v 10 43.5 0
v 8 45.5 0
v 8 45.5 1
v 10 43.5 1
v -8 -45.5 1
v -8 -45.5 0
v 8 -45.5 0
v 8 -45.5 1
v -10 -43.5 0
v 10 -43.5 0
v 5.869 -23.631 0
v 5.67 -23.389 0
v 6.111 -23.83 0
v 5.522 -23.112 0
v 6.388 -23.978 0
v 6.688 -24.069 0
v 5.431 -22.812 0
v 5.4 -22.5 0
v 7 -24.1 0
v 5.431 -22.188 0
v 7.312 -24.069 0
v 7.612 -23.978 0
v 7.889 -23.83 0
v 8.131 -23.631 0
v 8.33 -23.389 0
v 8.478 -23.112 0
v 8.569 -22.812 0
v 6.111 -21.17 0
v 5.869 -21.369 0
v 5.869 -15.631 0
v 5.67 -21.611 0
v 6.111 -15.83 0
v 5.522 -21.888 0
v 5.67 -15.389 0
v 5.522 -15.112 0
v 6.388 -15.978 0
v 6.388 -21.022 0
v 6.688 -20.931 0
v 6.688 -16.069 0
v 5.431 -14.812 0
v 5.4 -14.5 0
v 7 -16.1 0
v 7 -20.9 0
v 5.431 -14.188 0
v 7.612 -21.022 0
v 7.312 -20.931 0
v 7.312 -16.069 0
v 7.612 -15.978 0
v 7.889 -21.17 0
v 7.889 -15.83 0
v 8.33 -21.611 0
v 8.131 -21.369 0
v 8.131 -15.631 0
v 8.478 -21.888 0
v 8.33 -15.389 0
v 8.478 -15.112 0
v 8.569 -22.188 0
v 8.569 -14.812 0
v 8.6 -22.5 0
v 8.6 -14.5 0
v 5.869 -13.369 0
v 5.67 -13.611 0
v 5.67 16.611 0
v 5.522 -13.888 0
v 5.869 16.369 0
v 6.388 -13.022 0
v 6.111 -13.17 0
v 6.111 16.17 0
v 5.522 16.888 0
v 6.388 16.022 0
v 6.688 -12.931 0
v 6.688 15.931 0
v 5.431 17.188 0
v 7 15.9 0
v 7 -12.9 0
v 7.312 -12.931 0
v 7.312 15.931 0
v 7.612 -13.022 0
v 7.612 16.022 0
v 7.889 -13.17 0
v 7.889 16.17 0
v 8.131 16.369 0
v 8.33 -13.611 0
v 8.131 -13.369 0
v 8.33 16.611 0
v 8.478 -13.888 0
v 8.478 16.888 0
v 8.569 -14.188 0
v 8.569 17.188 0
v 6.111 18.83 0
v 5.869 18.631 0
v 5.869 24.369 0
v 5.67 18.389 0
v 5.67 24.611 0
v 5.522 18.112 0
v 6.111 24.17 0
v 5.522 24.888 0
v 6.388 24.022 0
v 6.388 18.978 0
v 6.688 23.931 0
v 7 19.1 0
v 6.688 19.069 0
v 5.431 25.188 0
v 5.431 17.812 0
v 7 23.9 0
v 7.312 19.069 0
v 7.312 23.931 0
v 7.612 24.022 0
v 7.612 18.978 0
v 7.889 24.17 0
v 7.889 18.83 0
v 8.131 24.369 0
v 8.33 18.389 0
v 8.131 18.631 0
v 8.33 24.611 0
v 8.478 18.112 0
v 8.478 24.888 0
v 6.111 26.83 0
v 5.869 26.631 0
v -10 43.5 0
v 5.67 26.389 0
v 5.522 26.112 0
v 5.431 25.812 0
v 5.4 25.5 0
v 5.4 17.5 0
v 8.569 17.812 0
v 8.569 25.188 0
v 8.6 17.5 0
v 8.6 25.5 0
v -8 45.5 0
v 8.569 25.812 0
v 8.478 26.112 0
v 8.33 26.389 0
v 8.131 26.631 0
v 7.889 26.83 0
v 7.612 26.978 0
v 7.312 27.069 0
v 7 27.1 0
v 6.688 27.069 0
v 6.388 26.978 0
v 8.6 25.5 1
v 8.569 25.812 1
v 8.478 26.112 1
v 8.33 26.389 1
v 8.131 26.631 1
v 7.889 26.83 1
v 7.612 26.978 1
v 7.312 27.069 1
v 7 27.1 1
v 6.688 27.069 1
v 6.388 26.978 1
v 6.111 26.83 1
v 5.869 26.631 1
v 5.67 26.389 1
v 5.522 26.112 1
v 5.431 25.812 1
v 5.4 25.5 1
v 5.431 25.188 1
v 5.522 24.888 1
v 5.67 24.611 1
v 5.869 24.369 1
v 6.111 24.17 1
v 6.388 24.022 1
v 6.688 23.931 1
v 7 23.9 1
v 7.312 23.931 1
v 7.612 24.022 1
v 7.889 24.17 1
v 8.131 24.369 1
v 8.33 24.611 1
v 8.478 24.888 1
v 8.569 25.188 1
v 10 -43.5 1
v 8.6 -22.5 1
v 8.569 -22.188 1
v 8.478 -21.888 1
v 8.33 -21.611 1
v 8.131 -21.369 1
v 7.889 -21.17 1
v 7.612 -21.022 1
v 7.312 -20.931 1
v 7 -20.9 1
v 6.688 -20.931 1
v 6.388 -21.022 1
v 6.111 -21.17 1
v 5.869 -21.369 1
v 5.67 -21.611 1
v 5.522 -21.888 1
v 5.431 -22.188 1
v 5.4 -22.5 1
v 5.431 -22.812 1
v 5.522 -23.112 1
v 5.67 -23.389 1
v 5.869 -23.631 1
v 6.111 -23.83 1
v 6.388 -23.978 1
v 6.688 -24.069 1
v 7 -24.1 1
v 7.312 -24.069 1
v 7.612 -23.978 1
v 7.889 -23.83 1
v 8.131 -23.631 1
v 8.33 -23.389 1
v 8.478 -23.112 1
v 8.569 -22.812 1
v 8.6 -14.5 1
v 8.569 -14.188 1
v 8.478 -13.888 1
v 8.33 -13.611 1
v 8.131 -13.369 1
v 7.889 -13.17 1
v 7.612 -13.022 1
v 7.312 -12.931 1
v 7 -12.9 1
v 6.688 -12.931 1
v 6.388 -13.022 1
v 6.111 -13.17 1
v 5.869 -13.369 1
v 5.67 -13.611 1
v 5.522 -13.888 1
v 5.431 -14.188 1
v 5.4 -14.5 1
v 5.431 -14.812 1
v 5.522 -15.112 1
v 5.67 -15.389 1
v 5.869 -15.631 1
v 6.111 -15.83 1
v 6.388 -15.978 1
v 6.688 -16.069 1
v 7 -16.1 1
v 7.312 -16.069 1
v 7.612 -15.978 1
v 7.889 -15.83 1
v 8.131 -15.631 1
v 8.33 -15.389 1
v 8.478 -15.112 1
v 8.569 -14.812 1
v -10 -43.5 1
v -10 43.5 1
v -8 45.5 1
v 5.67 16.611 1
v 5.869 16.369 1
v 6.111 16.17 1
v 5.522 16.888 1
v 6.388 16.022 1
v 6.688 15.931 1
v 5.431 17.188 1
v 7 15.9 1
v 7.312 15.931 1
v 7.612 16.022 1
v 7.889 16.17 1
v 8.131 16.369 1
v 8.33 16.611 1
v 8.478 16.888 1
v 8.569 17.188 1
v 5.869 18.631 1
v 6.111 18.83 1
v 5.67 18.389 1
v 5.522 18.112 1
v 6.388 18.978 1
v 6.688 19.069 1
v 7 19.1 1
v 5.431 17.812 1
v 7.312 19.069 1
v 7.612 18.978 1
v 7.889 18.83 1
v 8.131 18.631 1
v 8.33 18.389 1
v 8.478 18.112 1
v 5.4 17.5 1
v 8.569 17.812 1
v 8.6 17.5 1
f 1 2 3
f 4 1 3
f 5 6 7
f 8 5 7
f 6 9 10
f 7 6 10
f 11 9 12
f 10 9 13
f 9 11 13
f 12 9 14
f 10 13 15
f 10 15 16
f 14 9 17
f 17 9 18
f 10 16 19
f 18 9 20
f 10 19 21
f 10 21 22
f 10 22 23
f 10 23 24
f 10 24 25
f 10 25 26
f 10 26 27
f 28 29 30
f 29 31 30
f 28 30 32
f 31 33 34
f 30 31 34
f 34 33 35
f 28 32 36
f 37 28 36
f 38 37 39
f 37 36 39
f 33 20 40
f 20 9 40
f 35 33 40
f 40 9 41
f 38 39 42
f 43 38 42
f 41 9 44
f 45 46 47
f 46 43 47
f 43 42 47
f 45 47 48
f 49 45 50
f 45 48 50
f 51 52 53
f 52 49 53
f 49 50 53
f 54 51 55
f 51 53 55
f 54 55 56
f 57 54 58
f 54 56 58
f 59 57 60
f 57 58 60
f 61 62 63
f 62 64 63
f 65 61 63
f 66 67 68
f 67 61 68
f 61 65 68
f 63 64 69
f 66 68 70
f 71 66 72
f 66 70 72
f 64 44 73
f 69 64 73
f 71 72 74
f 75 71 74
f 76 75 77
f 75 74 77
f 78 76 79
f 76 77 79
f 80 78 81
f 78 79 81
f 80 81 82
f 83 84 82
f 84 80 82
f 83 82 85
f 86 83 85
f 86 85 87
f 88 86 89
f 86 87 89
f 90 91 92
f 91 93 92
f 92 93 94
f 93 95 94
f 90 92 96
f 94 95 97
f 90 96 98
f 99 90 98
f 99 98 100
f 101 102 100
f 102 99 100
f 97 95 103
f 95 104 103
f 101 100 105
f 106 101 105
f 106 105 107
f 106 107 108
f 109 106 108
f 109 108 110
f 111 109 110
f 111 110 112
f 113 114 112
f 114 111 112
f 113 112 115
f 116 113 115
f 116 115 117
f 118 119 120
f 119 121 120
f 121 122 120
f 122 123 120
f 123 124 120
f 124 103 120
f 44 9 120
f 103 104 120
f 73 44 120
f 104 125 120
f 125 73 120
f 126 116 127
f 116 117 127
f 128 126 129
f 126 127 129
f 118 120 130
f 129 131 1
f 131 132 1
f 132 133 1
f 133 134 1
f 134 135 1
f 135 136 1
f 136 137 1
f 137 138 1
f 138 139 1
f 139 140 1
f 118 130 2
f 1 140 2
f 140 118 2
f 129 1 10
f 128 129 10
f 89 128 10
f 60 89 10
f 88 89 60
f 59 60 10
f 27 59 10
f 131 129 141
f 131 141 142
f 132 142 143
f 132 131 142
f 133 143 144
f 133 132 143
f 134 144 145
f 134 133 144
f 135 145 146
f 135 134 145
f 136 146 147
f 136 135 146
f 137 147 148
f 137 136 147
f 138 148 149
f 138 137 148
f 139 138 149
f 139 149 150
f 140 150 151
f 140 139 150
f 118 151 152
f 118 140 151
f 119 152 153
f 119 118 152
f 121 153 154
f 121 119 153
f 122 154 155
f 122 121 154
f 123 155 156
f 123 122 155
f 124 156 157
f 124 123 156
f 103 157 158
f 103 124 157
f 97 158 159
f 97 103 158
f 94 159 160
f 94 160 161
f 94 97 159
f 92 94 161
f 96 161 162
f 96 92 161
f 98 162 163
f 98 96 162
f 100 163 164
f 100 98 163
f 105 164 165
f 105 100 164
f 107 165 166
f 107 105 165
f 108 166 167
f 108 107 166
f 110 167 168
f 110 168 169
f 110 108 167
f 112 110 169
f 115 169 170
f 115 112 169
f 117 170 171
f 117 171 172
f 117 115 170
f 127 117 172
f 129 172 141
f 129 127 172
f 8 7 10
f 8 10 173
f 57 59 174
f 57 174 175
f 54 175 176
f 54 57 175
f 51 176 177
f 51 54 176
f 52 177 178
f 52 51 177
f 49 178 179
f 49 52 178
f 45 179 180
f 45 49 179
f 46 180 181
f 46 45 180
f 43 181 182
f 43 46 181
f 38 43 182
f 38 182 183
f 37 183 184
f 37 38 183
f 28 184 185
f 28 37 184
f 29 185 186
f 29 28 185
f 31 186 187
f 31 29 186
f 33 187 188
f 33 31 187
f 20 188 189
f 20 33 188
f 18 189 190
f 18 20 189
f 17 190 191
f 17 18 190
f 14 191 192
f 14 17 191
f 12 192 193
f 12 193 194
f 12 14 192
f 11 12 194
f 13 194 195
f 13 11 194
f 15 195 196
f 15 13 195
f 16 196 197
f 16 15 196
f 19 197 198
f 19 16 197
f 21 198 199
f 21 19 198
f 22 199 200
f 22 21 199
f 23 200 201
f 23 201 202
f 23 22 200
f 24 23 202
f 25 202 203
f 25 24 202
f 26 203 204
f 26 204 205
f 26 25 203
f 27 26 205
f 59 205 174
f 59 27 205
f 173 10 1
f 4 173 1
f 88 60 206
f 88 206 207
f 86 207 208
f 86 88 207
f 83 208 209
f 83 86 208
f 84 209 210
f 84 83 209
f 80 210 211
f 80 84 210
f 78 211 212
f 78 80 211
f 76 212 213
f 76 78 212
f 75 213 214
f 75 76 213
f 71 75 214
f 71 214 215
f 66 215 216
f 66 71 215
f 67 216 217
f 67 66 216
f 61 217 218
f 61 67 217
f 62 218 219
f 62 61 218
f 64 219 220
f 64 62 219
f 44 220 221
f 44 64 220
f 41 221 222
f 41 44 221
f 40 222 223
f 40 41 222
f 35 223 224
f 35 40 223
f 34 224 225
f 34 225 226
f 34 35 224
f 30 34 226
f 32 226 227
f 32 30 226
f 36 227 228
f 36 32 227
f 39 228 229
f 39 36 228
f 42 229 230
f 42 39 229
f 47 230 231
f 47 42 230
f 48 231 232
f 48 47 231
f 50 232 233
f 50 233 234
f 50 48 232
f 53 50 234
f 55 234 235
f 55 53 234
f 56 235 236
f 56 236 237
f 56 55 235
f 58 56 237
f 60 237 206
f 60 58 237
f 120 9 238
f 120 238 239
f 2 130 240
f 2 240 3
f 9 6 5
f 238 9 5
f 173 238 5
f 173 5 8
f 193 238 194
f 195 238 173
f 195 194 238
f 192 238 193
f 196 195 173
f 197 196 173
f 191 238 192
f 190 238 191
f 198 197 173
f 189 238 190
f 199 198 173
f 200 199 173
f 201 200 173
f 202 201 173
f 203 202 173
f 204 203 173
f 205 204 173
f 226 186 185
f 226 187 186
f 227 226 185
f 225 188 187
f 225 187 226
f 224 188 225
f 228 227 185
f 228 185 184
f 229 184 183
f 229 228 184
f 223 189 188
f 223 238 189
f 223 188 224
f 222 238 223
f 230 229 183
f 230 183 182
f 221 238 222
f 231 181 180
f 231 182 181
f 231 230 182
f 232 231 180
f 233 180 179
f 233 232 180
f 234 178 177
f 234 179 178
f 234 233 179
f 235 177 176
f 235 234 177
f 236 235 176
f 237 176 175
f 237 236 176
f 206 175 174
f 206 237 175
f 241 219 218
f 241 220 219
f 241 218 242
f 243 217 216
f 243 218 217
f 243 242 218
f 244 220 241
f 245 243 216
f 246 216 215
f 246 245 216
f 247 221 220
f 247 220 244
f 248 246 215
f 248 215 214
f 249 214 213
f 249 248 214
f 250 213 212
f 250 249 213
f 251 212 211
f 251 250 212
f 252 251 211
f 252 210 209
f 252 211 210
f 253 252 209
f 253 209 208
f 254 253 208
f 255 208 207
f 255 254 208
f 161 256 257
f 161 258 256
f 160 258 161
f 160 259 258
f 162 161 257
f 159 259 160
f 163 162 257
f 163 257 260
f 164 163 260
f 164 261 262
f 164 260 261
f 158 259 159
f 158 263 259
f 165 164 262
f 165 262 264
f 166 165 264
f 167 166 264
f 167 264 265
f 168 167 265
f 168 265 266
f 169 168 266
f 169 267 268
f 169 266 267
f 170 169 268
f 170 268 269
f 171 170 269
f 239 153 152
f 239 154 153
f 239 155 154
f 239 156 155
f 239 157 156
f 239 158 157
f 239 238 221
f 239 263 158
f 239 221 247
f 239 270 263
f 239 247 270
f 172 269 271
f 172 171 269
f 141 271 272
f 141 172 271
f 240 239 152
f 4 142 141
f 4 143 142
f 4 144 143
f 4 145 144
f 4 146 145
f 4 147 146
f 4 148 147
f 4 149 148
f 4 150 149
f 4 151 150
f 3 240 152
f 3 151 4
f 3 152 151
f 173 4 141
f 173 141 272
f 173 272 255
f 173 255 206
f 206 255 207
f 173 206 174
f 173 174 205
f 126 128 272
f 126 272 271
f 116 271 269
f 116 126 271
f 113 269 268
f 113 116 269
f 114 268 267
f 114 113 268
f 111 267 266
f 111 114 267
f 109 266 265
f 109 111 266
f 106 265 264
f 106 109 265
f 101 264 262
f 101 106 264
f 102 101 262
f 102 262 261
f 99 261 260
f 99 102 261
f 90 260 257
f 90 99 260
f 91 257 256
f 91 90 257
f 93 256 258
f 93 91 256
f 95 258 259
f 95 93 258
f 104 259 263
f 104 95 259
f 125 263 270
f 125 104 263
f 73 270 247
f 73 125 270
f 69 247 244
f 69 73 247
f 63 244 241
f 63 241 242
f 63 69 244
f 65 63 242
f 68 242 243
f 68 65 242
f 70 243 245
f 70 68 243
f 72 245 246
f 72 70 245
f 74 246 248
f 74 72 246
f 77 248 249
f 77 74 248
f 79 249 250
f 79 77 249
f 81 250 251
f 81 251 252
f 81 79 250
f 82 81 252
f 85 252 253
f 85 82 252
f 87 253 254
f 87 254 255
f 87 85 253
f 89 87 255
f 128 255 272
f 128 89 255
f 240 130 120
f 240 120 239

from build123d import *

# Parameters (mm, degrees)
SKETCH_1_W      = 20
SKETCH_1_H      = 91
SKETCH_1_R      = 1.6
EXTRUDE_1_DEPTH = 1
CHAMFER_1_SIZE  = 2


with BuildPart() as part:
    # 草图1 → 凸台-拉伸1 (new body)
    with BuildSketch(Plane.XY):
        Rectangle(SKETCH_1_W, SKETCH_1_H)
        with Locations((7, 25.5)):
            Circle(SKETCH_1_R, mode=Mode.SUBTRACT)
        with Locations((7, 17.5)):
            Circle(SKETCH_1_R, mode=Mode.SUBTRACT)
        with Locations((7, -14.5)):
            Circle(SKETCH_1_R, mode=Mode.SUBTRACT)
        with Locations((7, -22.5)):
            Circle(SKETCH_1_R, mode=Mode.SUBTRACT)
    extrude(amount=EXTRUDE_1_DEPTH)

    # 倒角1
    chamfer_1_edges = [part.edges().sort_by_distance(p)[0] for p in [
        (10, -45.5, 0.5),
        (-10, -45.5, 0.5),
        (-10, 45.5, 0.5),
        (10, 45.5, 0.5),
    ]]
    chamfer(chamfer_1_edges, length=CHAMFER_1_SIZE)


solid = part.part
